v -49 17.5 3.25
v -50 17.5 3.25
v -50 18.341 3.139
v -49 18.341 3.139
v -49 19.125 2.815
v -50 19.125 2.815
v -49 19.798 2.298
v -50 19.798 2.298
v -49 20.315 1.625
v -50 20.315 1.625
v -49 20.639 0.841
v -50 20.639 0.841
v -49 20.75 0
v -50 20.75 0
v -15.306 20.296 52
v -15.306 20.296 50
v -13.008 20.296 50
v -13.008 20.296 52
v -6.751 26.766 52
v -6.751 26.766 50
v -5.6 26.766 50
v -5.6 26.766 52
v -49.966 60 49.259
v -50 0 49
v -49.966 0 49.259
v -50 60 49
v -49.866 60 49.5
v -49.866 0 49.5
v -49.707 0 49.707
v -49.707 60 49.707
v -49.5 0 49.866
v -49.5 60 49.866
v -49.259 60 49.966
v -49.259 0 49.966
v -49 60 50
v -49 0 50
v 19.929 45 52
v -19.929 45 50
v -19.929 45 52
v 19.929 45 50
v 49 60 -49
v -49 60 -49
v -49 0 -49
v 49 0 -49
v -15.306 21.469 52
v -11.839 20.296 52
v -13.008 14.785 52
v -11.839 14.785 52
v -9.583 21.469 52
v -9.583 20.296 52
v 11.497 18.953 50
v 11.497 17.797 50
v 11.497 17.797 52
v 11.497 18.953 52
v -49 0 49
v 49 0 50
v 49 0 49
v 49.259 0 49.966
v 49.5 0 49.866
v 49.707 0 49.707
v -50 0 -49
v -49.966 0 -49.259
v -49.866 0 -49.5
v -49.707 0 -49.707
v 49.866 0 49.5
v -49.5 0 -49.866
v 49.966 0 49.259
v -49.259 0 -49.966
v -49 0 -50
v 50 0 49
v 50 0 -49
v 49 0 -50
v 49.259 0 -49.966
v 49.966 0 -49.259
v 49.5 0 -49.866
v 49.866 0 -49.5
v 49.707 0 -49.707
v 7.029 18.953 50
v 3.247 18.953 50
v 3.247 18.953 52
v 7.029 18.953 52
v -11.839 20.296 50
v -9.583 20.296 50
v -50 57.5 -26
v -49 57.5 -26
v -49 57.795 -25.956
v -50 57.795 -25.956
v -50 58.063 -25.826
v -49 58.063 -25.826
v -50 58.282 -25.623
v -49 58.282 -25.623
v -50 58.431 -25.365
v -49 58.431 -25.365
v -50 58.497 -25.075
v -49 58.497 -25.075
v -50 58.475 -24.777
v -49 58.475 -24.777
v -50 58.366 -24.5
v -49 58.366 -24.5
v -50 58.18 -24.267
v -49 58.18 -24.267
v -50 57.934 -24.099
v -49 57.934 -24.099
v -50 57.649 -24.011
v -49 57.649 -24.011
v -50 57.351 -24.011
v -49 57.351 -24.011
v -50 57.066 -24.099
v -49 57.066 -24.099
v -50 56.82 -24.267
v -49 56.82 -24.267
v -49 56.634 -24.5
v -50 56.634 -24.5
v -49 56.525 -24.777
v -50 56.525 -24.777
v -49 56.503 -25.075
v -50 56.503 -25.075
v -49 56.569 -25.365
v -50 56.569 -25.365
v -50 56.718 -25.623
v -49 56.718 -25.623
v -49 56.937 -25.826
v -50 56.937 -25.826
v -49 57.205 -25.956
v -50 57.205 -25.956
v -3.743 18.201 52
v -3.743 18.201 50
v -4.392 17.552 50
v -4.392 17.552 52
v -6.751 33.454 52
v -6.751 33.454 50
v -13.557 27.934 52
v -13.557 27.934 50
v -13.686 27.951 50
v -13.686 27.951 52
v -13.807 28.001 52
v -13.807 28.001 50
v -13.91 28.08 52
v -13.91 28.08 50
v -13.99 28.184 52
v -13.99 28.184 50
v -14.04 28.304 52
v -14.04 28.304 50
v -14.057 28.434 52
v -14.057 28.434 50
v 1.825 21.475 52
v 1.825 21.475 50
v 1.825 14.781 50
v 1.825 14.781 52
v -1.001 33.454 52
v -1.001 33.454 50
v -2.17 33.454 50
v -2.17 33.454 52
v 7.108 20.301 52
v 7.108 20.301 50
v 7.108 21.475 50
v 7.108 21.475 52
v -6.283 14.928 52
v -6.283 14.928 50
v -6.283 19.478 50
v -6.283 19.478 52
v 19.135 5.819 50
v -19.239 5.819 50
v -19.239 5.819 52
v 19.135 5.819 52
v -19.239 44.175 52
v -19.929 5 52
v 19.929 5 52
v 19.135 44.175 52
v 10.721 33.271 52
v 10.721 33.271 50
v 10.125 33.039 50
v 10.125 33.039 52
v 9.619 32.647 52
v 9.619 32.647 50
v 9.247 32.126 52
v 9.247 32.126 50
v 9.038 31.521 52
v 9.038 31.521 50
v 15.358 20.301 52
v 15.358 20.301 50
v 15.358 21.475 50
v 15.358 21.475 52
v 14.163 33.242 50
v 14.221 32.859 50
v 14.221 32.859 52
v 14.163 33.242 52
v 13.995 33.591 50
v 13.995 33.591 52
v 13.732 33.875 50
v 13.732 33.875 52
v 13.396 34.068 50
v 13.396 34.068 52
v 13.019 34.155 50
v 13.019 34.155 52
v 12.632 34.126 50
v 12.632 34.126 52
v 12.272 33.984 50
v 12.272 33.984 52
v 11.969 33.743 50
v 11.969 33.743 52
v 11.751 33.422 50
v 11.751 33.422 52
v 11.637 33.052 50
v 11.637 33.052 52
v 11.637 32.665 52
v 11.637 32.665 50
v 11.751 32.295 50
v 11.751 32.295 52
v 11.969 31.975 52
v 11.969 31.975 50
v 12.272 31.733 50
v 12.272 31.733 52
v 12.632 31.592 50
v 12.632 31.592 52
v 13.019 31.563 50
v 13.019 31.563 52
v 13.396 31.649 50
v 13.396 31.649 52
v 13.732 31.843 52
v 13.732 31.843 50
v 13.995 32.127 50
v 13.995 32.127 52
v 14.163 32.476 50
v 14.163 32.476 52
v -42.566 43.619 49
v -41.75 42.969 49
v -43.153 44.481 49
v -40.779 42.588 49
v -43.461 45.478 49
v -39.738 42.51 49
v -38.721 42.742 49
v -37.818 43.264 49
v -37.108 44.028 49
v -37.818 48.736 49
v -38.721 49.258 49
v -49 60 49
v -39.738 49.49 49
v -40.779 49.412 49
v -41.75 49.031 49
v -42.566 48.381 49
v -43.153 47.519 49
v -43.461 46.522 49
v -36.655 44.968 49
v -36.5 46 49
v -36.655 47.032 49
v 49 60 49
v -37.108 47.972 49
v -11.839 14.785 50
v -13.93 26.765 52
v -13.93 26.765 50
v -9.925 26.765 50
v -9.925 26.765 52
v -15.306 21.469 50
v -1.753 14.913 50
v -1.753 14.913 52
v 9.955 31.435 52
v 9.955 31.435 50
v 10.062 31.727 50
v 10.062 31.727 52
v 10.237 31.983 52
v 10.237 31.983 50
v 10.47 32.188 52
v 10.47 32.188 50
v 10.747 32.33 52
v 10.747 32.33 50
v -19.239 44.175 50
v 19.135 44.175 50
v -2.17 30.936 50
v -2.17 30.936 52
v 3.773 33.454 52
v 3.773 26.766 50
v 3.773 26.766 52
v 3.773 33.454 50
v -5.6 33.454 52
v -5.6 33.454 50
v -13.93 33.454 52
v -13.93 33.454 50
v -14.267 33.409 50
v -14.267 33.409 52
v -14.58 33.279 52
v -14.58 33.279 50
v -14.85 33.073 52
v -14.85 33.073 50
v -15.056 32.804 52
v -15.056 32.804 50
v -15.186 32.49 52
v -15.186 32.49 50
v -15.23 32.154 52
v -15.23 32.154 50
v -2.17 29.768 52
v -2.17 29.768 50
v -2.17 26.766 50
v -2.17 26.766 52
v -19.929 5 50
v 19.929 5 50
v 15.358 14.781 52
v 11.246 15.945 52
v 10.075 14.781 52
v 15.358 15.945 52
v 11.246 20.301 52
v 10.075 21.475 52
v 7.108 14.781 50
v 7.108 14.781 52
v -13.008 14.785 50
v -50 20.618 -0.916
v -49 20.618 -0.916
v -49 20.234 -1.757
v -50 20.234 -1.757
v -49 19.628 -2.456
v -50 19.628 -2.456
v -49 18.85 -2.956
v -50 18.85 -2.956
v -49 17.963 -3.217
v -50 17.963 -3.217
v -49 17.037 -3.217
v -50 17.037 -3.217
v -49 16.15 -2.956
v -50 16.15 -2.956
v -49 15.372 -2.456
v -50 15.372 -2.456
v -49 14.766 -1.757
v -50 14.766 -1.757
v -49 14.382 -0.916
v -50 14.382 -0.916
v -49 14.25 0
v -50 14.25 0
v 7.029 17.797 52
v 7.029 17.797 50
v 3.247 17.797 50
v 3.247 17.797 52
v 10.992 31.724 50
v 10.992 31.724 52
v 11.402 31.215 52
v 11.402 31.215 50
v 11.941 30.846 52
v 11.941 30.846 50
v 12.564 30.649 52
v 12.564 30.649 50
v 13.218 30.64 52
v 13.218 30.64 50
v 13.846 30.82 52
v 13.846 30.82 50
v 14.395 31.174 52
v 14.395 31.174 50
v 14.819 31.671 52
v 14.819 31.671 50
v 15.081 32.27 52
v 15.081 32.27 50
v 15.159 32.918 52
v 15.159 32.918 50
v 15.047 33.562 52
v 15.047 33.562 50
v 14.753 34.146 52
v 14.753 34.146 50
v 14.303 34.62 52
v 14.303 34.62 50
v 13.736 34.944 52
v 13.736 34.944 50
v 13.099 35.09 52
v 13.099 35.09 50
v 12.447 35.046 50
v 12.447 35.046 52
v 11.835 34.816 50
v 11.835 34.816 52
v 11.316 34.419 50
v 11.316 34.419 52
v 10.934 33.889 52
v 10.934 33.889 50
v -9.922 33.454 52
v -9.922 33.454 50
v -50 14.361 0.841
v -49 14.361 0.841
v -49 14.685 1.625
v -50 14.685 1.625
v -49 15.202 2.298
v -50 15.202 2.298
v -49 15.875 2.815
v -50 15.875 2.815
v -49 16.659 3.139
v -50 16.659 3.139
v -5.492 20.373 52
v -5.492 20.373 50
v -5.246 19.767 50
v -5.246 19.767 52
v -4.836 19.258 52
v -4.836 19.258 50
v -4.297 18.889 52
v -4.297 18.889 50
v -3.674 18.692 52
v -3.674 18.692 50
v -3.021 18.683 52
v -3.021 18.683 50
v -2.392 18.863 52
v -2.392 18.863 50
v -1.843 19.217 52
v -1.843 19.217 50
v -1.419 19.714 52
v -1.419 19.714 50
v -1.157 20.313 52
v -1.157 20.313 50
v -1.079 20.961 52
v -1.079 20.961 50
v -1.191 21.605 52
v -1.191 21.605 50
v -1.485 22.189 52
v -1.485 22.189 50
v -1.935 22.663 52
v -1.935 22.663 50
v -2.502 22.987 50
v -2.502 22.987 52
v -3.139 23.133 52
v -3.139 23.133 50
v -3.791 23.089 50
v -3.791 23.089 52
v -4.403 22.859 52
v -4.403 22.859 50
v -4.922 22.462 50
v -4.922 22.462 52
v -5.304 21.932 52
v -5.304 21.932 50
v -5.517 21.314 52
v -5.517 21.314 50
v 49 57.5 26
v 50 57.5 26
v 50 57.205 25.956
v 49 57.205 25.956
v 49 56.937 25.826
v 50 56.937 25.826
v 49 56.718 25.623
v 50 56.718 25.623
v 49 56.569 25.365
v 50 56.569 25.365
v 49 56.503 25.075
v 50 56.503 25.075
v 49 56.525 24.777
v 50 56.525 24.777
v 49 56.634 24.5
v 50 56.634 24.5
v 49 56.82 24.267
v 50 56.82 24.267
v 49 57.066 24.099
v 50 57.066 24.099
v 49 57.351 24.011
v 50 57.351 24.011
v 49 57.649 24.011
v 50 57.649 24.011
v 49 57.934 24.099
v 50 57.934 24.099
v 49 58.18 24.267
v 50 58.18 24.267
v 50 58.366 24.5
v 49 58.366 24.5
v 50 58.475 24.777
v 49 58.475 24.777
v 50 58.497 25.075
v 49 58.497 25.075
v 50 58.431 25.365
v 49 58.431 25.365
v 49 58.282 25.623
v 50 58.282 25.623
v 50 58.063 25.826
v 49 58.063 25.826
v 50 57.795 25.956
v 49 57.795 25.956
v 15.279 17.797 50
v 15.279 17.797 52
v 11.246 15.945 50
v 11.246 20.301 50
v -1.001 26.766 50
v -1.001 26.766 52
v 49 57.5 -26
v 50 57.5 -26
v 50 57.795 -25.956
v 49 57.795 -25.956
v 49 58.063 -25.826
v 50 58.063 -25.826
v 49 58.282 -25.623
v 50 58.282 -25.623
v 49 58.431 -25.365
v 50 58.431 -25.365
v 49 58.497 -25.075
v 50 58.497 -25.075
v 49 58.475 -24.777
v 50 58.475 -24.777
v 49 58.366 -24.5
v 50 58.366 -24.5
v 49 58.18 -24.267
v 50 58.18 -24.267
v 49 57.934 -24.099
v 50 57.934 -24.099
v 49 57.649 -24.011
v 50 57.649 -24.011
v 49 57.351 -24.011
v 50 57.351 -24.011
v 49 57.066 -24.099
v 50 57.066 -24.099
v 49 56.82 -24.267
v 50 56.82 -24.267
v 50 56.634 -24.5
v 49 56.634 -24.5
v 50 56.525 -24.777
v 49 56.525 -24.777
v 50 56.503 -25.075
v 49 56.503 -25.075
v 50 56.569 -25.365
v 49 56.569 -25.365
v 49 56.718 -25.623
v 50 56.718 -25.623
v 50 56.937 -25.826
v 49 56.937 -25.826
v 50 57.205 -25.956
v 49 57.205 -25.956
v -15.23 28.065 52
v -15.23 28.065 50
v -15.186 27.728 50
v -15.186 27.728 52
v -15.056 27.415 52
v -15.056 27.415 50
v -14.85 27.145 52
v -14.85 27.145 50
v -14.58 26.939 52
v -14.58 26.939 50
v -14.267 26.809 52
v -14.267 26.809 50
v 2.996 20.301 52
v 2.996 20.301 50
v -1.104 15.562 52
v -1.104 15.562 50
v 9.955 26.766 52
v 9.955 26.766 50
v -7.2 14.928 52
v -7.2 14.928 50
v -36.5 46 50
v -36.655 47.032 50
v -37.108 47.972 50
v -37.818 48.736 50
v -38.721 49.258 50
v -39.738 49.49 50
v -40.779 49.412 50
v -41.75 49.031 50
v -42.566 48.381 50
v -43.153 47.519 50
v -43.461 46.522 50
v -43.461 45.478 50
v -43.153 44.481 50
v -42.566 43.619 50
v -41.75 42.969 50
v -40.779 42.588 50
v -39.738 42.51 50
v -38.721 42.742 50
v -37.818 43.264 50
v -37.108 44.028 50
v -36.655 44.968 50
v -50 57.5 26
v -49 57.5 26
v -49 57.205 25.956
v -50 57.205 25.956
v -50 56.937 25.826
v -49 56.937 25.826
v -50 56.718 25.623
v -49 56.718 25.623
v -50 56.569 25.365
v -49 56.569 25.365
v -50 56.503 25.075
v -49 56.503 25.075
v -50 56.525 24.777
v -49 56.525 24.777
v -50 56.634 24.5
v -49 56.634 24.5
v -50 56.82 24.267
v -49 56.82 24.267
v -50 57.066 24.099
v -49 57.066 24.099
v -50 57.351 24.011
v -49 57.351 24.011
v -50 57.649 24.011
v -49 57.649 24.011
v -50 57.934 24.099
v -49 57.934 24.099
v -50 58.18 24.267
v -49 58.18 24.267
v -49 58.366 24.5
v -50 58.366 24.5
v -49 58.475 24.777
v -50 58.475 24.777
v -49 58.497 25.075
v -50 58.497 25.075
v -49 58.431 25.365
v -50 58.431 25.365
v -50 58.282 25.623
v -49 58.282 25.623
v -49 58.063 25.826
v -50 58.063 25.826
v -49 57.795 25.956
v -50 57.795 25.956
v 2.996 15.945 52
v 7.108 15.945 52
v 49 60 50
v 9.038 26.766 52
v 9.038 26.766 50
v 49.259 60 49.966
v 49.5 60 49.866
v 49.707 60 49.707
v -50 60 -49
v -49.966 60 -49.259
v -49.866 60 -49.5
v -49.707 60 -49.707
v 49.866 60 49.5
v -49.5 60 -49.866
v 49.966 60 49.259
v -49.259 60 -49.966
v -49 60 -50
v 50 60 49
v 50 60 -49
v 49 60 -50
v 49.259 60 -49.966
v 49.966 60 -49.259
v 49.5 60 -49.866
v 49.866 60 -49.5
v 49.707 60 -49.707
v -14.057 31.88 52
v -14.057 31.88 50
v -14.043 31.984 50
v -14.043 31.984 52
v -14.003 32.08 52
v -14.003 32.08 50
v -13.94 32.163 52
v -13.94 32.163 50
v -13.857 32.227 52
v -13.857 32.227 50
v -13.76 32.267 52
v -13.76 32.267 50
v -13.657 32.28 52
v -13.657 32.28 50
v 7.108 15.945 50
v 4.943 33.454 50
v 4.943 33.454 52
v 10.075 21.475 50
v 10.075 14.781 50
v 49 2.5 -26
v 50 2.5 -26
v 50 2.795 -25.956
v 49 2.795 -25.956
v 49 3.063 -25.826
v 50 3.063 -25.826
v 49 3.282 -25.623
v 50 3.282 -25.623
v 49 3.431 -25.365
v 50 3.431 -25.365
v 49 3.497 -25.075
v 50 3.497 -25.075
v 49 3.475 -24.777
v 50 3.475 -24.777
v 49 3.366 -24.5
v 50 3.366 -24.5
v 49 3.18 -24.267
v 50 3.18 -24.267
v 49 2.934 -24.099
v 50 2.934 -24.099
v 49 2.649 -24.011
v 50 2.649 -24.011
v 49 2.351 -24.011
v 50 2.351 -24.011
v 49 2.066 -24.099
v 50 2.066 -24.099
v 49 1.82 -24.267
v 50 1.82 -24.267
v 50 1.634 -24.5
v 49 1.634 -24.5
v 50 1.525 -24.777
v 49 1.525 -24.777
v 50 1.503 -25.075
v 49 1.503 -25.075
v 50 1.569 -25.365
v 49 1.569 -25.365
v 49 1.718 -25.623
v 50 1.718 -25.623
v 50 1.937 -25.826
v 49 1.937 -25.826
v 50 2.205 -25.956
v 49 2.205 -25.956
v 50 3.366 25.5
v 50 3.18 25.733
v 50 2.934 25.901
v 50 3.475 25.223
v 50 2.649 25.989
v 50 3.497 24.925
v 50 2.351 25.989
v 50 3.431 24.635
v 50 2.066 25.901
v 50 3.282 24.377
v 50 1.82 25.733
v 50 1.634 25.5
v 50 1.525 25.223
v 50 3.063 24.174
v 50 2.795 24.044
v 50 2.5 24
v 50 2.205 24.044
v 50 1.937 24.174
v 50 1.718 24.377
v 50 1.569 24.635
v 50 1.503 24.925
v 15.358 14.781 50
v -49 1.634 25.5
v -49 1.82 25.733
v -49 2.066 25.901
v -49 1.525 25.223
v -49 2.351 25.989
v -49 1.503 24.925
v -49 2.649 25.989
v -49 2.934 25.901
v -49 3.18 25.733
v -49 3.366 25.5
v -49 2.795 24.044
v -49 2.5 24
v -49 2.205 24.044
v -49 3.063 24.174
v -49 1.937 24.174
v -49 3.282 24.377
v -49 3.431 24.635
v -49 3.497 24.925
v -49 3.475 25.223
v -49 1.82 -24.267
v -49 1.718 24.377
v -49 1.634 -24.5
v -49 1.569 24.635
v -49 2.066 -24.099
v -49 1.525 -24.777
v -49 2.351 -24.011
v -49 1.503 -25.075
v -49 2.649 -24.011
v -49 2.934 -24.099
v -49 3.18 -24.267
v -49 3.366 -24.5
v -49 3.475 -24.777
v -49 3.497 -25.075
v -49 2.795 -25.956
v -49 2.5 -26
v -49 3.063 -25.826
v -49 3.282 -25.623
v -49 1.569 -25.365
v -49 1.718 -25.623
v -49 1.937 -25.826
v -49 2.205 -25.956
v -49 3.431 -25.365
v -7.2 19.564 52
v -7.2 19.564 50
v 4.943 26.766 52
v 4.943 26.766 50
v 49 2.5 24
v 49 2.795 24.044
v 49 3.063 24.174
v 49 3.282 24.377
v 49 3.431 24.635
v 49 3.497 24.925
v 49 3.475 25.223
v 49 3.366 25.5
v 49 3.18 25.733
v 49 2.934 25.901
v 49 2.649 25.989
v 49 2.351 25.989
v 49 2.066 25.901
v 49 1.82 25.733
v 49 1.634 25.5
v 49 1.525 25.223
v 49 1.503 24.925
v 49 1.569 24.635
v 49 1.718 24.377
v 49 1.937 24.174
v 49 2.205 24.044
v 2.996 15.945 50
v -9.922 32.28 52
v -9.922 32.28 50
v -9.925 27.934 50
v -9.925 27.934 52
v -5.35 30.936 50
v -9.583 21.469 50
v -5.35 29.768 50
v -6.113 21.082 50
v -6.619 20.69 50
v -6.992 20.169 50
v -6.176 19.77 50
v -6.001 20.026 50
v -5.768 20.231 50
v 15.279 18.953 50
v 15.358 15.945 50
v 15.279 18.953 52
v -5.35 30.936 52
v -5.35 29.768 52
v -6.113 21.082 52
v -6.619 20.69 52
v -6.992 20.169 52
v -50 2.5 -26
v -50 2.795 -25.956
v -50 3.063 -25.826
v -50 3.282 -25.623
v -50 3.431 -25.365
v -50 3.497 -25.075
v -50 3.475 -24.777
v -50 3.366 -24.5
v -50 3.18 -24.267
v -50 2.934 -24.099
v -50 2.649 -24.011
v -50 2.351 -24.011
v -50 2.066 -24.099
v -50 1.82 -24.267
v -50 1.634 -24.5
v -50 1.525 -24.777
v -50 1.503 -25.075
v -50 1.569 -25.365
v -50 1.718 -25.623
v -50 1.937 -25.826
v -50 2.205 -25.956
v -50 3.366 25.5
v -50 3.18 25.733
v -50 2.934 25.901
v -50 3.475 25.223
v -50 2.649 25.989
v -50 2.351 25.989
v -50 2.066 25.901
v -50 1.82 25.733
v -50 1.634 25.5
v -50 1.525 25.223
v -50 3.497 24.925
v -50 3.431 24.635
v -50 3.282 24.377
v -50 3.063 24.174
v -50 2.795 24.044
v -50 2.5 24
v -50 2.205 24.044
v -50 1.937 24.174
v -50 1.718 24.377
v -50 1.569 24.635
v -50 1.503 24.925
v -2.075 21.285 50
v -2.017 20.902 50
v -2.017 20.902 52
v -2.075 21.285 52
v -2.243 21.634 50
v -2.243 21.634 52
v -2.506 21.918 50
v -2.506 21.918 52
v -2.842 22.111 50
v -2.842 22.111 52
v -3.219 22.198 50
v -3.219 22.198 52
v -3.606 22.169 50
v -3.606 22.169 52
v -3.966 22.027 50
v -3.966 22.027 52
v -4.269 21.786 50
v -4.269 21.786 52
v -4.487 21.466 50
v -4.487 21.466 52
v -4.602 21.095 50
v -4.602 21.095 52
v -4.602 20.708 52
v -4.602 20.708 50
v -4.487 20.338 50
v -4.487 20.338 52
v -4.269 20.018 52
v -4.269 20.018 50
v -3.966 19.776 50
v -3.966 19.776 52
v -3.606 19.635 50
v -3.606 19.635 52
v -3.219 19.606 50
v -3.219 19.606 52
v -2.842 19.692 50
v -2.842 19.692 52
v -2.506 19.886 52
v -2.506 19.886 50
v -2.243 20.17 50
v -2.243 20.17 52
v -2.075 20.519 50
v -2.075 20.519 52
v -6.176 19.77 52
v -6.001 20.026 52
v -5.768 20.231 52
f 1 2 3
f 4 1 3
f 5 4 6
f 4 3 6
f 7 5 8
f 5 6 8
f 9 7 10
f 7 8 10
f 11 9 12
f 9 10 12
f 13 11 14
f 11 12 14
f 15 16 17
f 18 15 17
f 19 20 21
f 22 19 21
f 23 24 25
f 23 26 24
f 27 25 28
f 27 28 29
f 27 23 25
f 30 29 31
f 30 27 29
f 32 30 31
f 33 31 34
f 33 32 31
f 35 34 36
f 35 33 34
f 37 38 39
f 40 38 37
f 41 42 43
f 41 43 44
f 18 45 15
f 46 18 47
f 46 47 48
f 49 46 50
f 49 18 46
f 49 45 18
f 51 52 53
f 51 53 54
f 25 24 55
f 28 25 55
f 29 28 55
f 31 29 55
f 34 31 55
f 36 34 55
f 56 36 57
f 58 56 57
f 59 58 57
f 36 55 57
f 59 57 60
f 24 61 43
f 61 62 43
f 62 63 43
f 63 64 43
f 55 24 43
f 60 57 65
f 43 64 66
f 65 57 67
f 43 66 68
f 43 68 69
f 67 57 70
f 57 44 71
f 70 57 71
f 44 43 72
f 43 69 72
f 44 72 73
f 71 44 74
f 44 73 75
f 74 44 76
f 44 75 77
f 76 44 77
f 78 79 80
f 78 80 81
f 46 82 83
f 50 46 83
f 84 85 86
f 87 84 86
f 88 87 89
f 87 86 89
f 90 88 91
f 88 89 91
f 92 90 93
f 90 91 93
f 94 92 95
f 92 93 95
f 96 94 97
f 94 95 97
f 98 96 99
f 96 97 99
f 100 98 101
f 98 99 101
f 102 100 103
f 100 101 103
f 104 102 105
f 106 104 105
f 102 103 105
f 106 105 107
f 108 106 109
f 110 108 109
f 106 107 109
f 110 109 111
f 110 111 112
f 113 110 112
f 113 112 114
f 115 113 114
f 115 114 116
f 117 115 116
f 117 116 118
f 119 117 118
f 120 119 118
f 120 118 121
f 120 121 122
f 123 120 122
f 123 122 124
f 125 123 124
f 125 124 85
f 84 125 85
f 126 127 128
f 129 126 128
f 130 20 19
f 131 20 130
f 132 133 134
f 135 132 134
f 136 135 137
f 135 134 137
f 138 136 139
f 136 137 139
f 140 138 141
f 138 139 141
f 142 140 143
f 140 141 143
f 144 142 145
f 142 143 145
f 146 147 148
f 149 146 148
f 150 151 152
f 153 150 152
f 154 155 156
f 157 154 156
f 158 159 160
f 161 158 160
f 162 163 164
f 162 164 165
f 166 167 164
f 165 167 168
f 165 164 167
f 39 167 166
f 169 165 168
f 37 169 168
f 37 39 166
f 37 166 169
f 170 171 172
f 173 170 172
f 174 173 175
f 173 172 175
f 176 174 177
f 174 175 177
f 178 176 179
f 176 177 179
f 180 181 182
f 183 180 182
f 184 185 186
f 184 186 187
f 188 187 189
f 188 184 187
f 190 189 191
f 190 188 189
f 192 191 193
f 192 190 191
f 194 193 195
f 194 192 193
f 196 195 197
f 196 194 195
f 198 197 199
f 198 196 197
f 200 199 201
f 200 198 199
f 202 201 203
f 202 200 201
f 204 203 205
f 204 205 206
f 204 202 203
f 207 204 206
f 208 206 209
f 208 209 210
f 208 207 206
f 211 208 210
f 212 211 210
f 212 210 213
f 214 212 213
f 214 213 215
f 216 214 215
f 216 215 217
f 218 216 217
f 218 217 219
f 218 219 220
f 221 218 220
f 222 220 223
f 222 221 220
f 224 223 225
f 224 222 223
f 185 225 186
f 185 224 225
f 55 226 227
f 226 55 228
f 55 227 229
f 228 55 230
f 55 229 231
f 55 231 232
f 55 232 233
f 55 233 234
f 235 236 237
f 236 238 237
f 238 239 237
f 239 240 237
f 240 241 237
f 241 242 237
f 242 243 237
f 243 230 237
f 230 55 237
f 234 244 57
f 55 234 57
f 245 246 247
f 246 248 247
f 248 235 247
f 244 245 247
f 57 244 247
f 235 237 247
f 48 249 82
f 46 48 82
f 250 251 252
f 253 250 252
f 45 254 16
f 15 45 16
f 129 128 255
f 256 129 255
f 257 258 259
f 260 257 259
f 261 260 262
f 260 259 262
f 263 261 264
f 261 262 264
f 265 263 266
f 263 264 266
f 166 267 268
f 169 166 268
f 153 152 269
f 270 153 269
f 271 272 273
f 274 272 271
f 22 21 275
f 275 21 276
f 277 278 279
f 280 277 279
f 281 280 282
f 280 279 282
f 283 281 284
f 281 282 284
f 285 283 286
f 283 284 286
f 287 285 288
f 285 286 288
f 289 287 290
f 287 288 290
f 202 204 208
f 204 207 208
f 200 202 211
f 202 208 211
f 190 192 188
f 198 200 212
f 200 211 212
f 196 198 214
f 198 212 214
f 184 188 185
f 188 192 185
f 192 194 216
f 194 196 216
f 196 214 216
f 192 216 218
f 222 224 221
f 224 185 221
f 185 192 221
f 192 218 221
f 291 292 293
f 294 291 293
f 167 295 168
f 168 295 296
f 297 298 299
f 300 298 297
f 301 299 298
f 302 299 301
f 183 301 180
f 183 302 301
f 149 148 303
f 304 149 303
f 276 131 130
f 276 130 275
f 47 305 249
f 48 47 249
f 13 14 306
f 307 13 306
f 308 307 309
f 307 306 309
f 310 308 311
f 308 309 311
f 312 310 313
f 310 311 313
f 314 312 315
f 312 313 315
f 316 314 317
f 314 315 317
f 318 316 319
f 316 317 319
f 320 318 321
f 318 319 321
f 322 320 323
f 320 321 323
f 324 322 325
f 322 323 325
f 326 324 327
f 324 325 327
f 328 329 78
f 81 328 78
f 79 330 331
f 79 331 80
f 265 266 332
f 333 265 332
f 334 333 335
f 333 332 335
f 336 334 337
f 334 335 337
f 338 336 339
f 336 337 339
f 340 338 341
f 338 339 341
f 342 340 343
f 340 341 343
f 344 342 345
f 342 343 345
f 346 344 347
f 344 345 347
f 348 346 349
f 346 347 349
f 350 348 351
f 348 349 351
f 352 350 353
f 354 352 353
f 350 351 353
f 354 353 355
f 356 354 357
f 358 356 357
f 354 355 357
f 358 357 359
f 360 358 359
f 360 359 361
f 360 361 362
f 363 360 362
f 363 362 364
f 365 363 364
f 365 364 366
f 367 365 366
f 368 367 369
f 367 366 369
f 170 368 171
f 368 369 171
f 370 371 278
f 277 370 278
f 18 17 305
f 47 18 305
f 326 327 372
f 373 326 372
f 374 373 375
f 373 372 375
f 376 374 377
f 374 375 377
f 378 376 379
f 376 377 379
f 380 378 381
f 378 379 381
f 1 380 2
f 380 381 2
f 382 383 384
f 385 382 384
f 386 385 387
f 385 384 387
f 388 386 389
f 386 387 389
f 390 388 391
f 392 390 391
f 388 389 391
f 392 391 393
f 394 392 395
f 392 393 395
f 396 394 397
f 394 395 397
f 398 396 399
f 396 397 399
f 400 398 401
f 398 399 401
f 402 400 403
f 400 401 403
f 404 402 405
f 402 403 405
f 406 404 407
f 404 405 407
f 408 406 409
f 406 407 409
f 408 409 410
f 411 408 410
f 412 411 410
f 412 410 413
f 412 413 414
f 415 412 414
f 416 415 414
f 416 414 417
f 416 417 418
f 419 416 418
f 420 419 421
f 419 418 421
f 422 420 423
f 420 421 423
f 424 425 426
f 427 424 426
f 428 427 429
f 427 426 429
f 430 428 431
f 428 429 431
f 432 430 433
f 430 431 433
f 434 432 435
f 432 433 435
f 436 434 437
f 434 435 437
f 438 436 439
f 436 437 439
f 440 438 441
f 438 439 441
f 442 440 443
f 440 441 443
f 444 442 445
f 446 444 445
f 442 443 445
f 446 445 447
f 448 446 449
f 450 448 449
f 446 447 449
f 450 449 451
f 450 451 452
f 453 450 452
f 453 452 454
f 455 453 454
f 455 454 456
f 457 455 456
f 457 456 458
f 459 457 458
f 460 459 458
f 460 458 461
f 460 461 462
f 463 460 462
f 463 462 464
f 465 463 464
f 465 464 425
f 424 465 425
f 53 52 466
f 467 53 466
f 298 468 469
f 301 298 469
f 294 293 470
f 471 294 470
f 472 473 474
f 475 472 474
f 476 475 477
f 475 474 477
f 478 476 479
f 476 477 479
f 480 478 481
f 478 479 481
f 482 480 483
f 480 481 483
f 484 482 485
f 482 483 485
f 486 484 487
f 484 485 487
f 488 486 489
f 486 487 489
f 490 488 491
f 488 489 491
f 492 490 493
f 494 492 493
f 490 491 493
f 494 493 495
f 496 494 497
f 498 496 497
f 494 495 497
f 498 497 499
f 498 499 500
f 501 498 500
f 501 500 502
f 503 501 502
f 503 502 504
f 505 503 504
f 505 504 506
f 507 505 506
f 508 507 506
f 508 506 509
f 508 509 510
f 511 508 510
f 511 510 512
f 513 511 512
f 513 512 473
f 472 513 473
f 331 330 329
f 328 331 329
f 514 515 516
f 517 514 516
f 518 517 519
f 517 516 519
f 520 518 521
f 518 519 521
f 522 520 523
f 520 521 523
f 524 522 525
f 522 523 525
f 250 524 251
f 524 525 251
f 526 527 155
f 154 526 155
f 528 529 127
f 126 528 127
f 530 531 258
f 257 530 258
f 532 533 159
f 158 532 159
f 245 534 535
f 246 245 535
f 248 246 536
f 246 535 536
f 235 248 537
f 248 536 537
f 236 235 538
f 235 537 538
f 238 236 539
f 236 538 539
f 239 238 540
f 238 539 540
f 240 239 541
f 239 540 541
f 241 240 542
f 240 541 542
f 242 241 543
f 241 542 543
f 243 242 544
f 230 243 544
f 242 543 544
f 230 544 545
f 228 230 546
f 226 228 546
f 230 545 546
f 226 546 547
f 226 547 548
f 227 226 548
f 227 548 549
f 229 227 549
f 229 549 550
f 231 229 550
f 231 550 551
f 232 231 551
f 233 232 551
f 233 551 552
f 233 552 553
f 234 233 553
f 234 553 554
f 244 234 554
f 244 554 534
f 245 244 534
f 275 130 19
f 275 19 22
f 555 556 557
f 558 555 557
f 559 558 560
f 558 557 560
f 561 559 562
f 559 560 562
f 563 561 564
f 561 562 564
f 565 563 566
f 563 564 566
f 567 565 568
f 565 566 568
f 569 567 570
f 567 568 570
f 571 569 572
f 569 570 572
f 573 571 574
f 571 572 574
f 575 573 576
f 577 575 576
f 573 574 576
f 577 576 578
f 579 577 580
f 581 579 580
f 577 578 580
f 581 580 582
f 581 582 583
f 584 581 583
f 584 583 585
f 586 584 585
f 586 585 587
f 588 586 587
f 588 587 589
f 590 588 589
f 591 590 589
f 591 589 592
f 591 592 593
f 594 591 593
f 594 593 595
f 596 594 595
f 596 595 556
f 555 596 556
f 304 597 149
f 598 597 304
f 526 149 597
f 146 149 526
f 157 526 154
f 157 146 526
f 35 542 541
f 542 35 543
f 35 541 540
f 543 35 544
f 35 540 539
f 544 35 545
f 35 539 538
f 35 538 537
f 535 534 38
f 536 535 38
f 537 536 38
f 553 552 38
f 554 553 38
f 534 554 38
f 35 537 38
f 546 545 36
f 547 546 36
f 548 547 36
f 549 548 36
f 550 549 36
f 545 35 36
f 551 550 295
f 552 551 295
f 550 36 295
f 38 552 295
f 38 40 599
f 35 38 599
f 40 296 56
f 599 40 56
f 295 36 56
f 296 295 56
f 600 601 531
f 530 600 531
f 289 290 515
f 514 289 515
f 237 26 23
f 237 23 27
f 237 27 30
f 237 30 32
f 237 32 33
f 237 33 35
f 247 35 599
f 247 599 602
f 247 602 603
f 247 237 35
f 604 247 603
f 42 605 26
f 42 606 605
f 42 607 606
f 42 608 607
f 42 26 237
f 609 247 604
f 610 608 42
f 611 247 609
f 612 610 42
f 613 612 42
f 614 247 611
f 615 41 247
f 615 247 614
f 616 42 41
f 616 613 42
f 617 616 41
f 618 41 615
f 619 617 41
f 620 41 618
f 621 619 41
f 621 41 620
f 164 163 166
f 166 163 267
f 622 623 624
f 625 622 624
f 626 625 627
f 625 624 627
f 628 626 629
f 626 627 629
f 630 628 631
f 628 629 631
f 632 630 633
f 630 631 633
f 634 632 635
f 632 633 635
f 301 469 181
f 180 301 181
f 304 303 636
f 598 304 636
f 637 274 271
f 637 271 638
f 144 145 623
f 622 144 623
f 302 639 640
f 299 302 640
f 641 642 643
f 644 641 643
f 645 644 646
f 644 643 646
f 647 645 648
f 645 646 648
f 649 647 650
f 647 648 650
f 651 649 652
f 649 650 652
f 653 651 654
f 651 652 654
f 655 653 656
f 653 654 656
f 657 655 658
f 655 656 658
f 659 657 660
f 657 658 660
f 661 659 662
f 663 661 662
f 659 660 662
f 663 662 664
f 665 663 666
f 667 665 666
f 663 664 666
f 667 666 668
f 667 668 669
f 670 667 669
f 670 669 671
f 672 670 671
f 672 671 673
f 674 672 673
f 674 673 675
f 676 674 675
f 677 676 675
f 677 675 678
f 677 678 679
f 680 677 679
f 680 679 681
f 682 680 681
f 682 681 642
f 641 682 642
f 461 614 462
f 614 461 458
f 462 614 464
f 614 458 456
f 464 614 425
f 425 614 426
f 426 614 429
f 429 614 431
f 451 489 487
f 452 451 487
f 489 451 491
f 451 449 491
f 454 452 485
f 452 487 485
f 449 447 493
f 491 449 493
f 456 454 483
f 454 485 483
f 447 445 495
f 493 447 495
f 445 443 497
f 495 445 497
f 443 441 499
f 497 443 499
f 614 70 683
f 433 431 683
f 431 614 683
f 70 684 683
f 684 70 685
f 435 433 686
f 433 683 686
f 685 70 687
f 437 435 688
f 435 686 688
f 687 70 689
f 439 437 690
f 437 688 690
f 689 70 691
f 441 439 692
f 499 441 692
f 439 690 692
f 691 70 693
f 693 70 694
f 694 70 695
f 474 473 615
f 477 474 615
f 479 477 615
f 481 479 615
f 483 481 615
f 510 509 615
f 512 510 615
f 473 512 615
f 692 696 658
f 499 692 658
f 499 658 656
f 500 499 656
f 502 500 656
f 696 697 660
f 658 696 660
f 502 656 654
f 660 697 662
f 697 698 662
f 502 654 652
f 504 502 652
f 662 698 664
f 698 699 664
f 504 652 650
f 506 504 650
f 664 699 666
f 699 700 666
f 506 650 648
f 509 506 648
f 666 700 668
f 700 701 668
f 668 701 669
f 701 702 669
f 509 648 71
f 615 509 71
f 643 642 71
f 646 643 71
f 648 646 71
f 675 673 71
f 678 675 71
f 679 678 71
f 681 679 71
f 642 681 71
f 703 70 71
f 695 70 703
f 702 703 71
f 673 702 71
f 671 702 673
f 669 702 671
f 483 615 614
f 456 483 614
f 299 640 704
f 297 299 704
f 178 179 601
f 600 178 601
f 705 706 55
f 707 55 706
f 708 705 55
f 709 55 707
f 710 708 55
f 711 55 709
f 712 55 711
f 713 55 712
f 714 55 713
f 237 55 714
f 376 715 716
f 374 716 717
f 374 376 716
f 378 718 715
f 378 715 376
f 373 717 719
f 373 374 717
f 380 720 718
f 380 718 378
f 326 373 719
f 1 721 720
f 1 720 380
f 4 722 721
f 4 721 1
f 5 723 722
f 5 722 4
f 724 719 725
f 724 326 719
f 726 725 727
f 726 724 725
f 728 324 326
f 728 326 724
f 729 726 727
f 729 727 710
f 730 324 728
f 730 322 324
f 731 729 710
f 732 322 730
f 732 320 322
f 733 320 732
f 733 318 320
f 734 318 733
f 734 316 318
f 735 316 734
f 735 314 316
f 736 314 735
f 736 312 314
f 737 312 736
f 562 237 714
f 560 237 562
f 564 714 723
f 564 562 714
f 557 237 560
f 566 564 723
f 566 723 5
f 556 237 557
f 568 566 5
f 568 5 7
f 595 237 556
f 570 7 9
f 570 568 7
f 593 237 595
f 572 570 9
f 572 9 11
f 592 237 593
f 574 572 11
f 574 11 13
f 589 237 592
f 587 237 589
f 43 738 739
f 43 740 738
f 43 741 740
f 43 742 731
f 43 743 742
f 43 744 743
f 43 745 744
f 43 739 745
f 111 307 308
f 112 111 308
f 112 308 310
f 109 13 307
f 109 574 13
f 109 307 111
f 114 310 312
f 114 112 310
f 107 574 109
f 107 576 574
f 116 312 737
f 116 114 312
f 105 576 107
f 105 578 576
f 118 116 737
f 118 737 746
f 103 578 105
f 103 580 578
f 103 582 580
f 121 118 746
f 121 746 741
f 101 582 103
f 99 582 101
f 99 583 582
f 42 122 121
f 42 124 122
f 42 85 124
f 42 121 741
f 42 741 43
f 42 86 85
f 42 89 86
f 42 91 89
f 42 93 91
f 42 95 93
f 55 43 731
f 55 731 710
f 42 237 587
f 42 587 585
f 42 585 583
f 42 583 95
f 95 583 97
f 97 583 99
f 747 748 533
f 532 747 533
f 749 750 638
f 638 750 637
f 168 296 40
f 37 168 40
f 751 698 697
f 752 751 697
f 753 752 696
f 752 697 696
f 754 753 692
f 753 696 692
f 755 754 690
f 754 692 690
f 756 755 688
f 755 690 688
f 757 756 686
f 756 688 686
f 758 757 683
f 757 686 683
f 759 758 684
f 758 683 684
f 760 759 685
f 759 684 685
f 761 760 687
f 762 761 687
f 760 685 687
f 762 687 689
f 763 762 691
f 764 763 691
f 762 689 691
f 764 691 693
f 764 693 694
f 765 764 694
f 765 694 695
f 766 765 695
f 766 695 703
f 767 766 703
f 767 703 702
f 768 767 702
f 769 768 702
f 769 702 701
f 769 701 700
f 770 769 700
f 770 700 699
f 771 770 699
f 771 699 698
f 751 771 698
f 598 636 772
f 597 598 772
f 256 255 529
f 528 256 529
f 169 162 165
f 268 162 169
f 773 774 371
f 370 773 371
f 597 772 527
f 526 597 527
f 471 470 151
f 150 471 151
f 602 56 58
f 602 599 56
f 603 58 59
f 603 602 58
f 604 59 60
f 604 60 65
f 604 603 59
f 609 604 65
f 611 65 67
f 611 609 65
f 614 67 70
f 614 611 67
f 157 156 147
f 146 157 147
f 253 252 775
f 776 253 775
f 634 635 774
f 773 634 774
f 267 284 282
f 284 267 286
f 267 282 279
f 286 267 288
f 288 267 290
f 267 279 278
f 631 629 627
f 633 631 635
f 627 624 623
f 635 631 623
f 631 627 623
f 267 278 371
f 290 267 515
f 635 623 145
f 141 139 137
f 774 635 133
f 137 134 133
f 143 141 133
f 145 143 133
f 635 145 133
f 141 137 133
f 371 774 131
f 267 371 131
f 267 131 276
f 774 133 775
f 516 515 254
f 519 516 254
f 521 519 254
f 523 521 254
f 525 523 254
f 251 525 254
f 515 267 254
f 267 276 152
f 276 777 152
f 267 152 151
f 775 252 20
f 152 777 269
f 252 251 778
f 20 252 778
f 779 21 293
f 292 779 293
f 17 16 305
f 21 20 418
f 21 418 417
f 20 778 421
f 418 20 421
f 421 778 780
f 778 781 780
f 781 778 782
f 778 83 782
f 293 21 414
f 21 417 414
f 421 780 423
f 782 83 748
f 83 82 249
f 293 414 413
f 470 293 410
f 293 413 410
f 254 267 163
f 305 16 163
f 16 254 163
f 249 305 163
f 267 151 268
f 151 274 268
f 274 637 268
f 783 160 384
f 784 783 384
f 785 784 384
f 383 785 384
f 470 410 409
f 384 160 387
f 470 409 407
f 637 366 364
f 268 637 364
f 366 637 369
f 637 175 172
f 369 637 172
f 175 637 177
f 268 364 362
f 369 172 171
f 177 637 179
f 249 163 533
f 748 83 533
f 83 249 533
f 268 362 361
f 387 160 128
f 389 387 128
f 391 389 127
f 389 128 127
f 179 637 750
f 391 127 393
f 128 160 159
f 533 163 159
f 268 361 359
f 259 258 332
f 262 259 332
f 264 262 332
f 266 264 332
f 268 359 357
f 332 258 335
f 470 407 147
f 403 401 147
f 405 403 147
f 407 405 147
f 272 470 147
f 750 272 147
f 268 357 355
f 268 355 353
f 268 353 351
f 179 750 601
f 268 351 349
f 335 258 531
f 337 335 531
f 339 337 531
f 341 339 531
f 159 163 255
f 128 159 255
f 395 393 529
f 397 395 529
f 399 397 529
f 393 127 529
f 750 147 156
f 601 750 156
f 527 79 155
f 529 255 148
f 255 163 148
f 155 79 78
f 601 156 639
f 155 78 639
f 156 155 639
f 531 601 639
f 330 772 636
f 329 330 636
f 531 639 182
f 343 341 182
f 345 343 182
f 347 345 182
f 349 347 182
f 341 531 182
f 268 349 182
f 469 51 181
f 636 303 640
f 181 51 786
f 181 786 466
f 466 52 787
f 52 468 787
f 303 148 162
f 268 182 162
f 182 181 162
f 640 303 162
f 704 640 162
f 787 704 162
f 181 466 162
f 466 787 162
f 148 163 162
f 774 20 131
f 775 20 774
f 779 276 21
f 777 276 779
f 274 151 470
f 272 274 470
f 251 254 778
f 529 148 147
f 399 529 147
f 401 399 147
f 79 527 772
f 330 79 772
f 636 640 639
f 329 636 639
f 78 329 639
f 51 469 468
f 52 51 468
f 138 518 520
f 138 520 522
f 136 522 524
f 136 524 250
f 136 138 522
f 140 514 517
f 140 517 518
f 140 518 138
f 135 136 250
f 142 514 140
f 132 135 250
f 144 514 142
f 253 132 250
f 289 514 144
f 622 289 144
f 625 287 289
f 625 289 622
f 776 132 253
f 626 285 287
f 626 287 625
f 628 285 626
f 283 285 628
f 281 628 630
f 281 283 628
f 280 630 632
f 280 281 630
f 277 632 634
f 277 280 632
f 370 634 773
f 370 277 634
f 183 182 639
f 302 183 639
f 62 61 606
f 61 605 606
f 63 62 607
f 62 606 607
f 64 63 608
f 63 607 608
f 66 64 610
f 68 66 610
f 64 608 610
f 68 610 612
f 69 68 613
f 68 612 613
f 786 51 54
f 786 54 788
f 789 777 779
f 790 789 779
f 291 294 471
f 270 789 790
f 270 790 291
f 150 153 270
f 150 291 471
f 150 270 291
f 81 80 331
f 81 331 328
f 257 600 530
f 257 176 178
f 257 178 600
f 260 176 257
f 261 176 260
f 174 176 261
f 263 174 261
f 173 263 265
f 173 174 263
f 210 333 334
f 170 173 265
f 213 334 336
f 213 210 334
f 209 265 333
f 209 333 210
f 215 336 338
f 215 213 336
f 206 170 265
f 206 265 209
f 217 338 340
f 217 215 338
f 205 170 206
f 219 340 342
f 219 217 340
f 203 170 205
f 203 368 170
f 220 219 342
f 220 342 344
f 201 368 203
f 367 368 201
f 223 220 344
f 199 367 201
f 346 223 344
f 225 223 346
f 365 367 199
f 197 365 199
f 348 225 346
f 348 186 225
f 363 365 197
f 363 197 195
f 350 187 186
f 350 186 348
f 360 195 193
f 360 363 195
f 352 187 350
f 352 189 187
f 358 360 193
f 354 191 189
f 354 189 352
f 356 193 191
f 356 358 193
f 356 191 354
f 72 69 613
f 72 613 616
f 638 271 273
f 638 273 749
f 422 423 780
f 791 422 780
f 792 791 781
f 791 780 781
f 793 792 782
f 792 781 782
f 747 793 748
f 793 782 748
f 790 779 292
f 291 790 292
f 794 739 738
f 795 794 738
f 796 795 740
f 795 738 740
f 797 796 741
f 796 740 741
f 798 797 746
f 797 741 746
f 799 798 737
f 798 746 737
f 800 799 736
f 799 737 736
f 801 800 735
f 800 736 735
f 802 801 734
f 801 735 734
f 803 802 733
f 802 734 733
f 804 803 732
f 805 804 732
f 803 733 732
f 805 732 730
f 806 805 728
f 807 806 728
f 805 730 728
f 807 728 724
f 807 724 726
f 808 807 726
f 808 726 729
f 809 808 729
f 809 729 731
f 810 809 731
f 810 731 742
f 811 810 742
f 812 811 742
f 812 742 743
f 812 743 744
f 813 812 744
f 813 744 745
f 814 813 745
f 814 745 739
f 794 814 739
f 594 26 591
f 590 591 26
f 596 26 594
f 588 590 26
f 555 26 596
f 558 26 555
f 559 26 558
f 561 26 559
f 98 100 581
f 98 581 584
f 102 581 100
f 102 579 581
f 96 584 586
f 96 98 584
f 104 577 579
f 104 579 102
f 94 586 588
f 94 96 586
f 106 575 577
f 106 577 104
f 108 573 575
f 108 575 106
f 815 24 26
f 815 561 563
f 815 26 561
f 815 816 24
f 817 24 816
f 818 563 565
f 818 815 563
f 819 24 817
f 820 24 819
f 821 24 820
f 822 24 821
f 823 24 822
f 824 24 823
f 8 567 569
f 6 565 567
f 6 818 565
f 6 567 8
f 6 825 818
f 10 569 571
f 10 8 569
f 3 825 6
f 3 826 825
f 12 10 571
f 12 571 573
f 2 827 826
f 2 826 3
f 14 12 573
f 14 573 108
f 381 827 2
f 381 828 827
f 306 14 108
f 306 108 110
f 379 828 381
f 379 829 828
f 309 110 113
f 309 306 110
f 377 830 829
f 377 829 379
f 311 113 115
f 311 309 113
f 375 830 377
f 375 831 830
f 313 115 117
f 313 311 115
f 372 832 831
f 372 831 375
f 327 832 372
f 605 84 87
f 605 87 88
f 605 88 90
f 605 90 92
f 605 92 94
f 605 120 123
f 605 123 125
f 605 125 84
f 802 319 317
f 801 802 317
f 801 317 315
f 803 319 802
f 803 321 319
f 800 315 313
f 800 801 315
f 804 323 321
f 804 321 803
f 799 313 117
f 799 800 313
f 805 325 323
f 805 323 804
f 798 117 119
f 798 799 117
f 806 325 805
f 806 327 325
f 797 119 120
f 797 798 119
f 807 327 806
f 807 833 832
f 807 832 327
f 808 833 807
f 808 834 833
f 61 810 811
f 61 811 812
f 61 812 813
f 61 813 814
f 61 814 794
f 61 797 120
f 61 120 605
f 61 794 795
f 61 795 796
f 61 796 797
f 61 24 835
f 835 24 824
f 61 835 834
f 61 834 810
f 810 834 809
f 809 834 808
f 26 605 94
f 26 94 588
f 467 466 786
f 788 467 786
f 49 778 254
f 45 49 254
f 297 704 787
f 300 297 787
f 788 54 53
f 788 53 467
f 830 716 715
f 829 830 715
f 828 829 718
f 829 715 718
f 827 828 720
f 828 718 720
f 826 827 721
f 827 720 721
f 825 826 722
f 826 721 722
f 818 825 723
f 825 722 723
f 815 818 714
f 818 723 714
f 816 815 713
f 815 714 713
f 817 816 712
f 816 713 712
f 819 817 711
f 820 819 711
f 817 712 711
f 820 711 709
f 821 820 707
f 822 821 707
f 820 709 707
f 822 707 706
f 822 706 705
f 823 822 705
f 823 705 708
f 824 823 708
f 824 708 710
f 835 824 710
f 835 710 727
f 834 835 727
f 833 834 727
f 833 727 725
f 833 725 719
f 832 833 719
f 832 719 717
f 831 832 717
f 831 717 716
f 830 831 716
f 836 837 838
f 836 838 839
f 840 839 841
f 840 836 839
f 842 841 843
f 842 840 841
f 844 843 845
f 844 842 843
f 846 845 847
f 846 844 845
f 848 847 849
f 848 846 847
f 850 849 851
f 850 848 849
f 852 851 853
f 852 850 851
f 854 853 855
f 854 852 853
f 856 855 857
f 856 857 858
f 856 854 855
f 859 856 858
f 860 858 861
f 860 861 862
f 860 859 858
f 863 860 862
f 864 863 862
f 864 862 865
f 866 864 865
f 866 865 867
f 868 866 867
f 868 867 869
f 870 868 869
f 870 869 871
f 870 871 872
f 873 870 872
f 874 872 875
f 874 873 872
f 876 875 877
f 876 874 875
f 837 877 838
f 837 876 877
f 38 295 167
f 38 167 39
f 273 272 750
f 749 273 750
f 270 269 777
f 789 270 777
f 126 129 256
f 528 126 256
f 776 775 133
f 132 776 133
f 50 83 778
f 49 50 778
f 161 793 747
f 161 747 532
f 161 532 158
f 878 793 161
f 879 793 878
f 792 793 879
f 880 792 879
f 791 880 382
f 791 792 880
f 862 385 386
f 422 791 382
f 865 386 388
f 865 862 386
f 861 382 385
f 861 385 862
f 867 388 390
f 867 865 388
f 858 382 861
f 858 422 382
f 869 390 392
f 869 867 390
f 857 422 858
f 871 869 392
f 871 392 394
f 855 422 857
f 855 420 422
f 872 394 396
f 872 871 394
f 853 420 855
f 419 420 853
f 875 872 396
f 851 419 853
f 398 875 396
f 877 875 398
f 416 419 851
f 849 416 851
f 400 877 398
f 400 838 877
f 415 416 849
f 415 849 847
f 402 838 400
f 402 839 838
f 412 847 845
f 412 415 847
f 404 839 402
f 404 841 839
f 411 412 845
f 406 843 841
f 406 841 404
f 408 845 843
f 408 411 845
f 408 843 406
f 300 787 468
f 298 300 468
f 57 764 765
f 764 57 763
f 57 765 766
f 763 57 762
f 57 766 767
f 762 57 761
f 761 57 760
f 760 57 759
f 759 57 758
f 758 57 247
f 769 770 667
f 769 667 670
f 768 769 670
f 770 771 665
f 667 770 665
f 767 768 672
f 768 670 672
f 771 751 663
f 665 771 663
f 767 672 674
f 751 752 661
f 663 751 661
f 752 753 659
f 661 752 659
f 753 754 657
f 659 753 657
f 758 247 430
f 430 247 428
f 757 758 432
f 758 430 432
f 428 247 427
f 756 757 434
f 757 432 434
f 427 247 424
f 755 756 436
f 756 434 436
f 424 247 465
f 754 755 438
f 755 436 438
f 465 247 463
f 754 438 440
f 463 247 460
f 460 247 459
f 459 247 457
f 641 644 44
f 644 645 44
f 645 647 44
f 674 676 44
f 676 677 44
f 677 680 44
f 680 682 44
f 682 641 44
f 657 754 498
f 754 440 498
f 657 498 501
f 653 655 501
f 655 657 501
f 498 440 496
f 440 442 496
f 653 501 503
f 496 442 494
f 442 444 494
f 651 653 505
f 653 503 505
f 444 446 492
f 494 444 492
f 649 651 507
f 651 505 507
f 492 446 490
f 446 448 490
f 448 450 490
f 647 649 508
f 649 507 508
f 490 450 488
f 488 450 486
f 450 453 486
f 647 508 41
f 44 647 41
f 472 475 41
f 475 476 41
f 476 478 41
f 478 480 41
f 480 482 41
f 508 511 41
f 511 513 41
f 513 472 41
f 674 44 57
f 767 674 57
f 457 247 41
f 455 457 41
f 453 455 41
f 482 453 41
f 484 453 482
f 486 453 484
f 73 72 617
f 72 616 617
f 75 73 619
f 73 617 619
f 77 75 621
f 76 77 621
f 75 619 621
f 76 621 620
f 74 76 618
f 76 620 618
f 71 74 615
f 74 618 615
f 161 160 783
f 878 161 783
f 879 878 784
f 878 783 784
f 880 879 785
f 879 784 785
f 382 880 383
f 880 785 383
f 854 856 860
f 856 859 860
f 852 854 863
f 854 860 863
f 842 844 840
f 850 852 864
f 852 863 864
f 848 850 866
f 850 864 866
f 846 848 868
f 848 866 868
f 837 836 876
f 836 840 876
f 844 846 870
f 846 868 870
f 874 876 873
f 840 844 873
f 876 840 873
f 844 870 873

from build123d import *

# Parameters (mm, degrees)
SKETCH1_W                 = 100
SKETCH1_H                 = 100
BOSS_EXTRUDE1_DEPTH       = 60
SKETCH2_W                 = 98
SKETCH2_H                 = 98
CUT_EXTRUDE1_DEPTH        = 60
SKETCH3_R                 = 1
CUT_EXTRUDE2_DEPTH        = 125
CUT_EXTRUDE3_DEPTH        = 10
BOSS_EXTRUDE4_START       = 50
BOSS_EXTRUDE4_OUTLINE_W   = 39.858082606
BOSS_EXTRUDE4_OUTLINE_H   = 40
BOSS_EXTRUDE4_OUTLINE_W_2 = 38.374033315
BOSS_EXTRUDE4_OUTLINE_H_2 = 38.356376399
BOSS_EXTRUDE4_OUTLINE_W_3 = 1.151682465
BOSS_EXTRUDE4_OUTLINE_H_3 = 6.68708673
BOSS_EXTRUDE4_OUTLINE_W_4 = 1.169732075
BOSS_EXTRUDE4_OUTLINE_R   = 1.29952059
BOSS_EXTRUDE4_OUTLINE_W_5 = 3.781559684
BOSS_EXTRUDE4_OUTLINE_H_4 = 1.155970525
BOSS_EXTRUDE4_OUTLINE_W_6 = 3.781559683
BOSS_EXTRUDE4_DEPTH       = 2
SKETCH9_R                 = 3.5
CUT_EXTRUDE4_DEPTH        = 10
FILLET1_R                 = 1


# Read off the part's stored shape, not the designer's step: Boss-Extrude4
with BuildPart() as part:
    # Sketch1 → Boss-Extrude1 (new body)
    with BuildSketch(Plane(origin=(0, 0, 0), x_dir=(1, 0, 0), z_dir=(0, 1, 0))):
        Rectangle(SKETCH1_W, SKETCH1_H)
    extrude(amount=BOSS_EXTRUDE1_DEPTH)

    # Sketch2 → Cut-Extrude1 (cut)
    with BuildSketch(Plane(origin=(0, 60, 0), x_dir=(1, 0, 0), z_dir=(0, 1, 0))):
        Rectangle(SKETCH2_W, SKETCH2_H)
    extrude(amount=-CUT_EXTRUDE1_DEPTH, mode=Mode.SUBTRACT)

    # Sketch3 → Cut-Extrude2 (cut)
    with BuildSketch(Plane(origin=(50, 0, 0), x_dir=(0, 0, -1), z_dir=(1, 0, 0))):
        with BuildLine():
            ThreePointArc((-24, 57.5), (-25, 58.5), (-26, 57.5))
            Line((-26, 57.5), (-24, 57.5))
        make_face()
        with BuildLine():
            Line((-24, 57.5), (-26, 57.5))
            ThreePointArc((-26, 57.5), (-25, 56.5), (-24, 57.5))
        make_face()
        with Locations((25, 57.5)):
            Circle(SKETCH3_R)
        with Locations((-25, 2.5)):
            Circle(SKETCH3_R)
        with Locations((25, 2.5)):
            Circle(SKETCH3_R)
    extrude(amount=-CUT_EXTRUDE2_DEPTH, mode=Mode.SUBTRACT)

    # Sketch5 → Cut-Extrude3 (cut)
    with BuildSketch(Plane.ZY.offset(50)):
        with BuildLine():
            ThreePointArc((3.25, 17.5), (2.298097039, 19.798097039), (0, 20.75))
            Line((0, 20.75), (0, 14.25))
            ThreePointArc((0, 14.25), (2.298097039, 15.201902961), (3.25, 17.5))
        make_face()
        with BuildLine():
            Line((0, 14.25), (0, 20.75))
            ThreePointArc((0, 20.75), (-3.25, 17.5), (0, 14.25))
        make_face()
    extrude(amount=-CUT_EXTRUDE3_DEPTH, mode=Mode.SUBTRACT)

    # Boss-Extrude4 outline → Boss-Extrude4 (add)
    # profile 1 of 13: a face of its own
    with BuildSketch(Plane.XY.offset(BOSS_EXTRUDE4_START)):
        with Locations((0, 25)):
            Rectangle(BOSS_EXTRUDE4_OUTLINE_W, BOSS_EXTRUDE4_OUTLINE_H)
        with Locations((-0.051593215, 24.997020999)):
            Rectangle(BOSS_EXTRUDE4_OUTLINE_W_2, BOSS_EXTRUDE4_OUTLINE_H_2, mode=Mode.SUBTRACT)
    # profile 2 of 13: a face of its own
    with BuildSketch(Plane.XY.offset(BOSS_EXTRUDE4_START)):
        with BuildLine():
            Line((-9.922016309, 32.280172221), (-9.922016309, 33.453564236))
            Line((-9.922016309, 33.453564236), (-13.93029333, 33.453564236))
            ThreePointArc((-13.93029333, 33.453564236), (-14.849532145, 33.072803052), (-15.23029333, 32.153564236))
            Line((-15.23029333, 32.153564236), (-15.23029333, 28.064542243))
            ThreePointArc((-15.23029333, 28.064542243), (-14.849532146, 27.145303428), (-13.93029333, 26.764542243))
            Line((-13.93029333, 26.764542243), (-9.925370196, 26.764542243))
            Line((-9.925370196, 26.764542243), (-9.925370196, 27.933655334))
            Line((-9.925370196, 27.933655334), (-13.55690574, 27.933655334))
            ThreePointArc((-13.55690574, 27.933655334), (-13.910459131, 28.080101943), (-14.05690574, 28.433655334))
            Line((-14.05690574, 28.433655334), (-14.05690574, 31.880172221))
            ThreePointArc((-14.05690574, 31.880172221), (-13.939748452, 32.163014933), (-13.65690574, 32.280172221))
            Line((-13.65690574, 32.280172221), (-9.922016309, 32.280172221))
        make_face()
    # profile 3 of 13: a face of its own
    with BuildSketch(Plane.XY.offset(BOSS_EXTRUDE4_START)):
        with Locations((-6.175417948, 30.110020871)):
            Rectangle(BOSS_EXTRUDE4_OUTLINE_W_3, BOSS_EXTRUDE4_OUTLINE_H_3)
    # profile 4 of 13: a face of its own
    with BuildSketch(Plane.XY.offset(BOSS_EXTRUDE4_START)):
        Polygon((-1.00100917, 26.766477506), (-1.00100917, 33.453564236), (-2.170113717, 33.453564236), (-2.170113717, 30.935634342), (-5.349717596, 30.935634342), (-5.349717596, 29.768397912), (-2.170113717, 29.768397912), (-2.170113717, 26.766477506), align=None)
    # profile 5 of 13: a face of its own
    with BuildSketch(Plane.XY.offset(BOSS_EXTRUDE4_START)):
        with Locations((4.358014237, 30.110020871)):
            Rectangle(BOSS_EXTRUDE4_OUTLINE_W_4, BOSS_EXTRUDE4_OUTLINE_H_3)
    # profile 6 of 13: a face of its own
    with BuildSketch(Plane.XY.offset(BOSS_EXTRUDE4_START)):
        with BuildLine():
            Line((9.038474855, 26.766477506), (9.954821181, 26.766477506))
            Line((9.954821181, 26.766477506), (9.954821181, 31.435250737))
            ThreePointArc((9.954821181, 31.435250737), (10.237464032, 31.982611448), (10.746519943, 32.329530473))
            ThreePointArc((10.746519943, 32.329530473), (15.159384473, 32.918290446), (10.721414833, 33.271046936))
            ThreePointArc((10.721414833, 33.271046936), (9.619160753, 32.646851071), (9.038474855, 31.521067599))
            Line((9.038474855, 31.521067599), (9.038474855, 26.766477506))
        make_face()
        with Locations((12.921637239, 32.858621929)):
            Circle(BOSS_EXTRUDE4_OUTLINE_R, mode=Mode.SUBTRACT)
    # profile 7 of 13: a face of its own
    with BuildSketch(Plane.XY.offset(BOSS_EXTRUDE4_START)):
        Polygon((15.358270934, 20.30132248), (15.358270934, 21.474568974), (10.074546624, 21.474568974), (10.074546624, 14.78091915), (15.358270934, 14.78091915), (15.358270934, 15.94490899), (11.24592521, 15.94490899), (11.24592521, 20.30132248), align=None)
    # profile 8 of 13: a face of its own
    with BuildSketch(Plane.XY.offset(BOSS_EXTRUDE4_START)):
        Polygon((7.108297958, 21.474568974), (1.824573649, 21.474568974), (1.824573649, 14.78091915), (7.108297958, 14.78091915), (7.108297958, 15.94490899), (2.995952235, 15.94490899), (2.995952235, 20.30132248), (7.108297958, 20.30132248), align=None)
    # profile 9 of 13: a face of its own
    with BuildSketch(Plane.XY.offset(BOSS_EXTRUDE4_START)):
        with Locations((13.387987428, 18.375193575)):
            Rectangle(BOSS_EXTRUDE4_OUTLINE_W_5, BOSS_EXTRUDE4_OUTLINE_H_4)
    # profile 10 of 13: a face of its own
    with BuildSketch(Plane.XY.offset(BOSS_EXTRUDE4_START)):
        with Locations((5.138014453, 18.375193575)):
            Rectangle(BOSS_EXTRUDE4_OUTLINE_W_6, BOSS_EXTRUDE4_OUTLINE_H_4)
    # profile 11 of 13: a face of its own
    with BuildSketch(Plane.XY.offset(BOSS_EXTRUDE4_START)):
        with BuildLine():
            Line((-6.283421644, 14.927747144), (-6.283421644, 19.478331399))
            ThreePointArc((-6.283421644, 19.478331399), (-6.000778792, 20.025692111), (-5.491722882, 20.372611136))
            ThreePointArc((-5.491722882, 20.372611136), (-1.078858352, 20.961371104), (-5.516827991, 21.314127598))
            ThreePointArc((-5.516827991, 21.314127598), (-6.619082072, 20.689931733), (-7.19976797, 19.564148262))
            Line((-7.19976797, 19.564148262), (-7.19976797, 14.927747144))
            Line((-7.19976797, 14.927747144), (-6.283421644, 14.927747144))
        make_face()
        with Locations((-3.316605586, 20.901702592)):
            Circle(BOSS_EXTRUDE4_OUTLINE_R, mode=Mode.SUBTRACT)
    # profile 12 of 13: a face of its own
    with BuildSketch(Plane.XY.offset(BOSS_EXTRUDE4_START)):
        Polygon((-3.743380156, 18.2010008), (-4.392168827, 17.55221213), (-1.75326942, 14.913312723), (-1.104480749, 15.562101393), align=None)
    # profile 13 of 13: a face of its own
    with BuildSketch(Plane.XY.offset(BOSS_EXTRUDE4_START)):
        Polygon((-15.305624402, 21.469309136), (-15.305624402, 20.296062642), (-13.00828814, 20.296062642), (-13.00828814, 14.784735536), (-11.838556065, 14.784735536), (-11.838556065, 20.296062642), (-9.582967691, 20.296062642), (-9.582967691, 21.469309136), align=None)
    extrude(amount=BOSS_EXTRUDE4_DEPTH)

    # Sketch9 → Cut-Extrude4 (cut)
    with BuildSketch(Plane.XY.offset(50)):
        with Locations((-40, 46)):
            Circle(SKETCH9_R)
    extrude(amount=-CUT_EXTRUDE4_DEPTH, mode=Mode.SUBTRACT)

    # Fillet1
    fillet1_edges = [part.edges().sort_by_distance(p)[0] for p in [
        (50, 30, 50),
        (-50, 30, 50),
        (-50, 30, -50),
        (50, 30, -50),
    ]]
    fillet(fillet1_edges, radius=FILLET1_R)


solid = part.part
